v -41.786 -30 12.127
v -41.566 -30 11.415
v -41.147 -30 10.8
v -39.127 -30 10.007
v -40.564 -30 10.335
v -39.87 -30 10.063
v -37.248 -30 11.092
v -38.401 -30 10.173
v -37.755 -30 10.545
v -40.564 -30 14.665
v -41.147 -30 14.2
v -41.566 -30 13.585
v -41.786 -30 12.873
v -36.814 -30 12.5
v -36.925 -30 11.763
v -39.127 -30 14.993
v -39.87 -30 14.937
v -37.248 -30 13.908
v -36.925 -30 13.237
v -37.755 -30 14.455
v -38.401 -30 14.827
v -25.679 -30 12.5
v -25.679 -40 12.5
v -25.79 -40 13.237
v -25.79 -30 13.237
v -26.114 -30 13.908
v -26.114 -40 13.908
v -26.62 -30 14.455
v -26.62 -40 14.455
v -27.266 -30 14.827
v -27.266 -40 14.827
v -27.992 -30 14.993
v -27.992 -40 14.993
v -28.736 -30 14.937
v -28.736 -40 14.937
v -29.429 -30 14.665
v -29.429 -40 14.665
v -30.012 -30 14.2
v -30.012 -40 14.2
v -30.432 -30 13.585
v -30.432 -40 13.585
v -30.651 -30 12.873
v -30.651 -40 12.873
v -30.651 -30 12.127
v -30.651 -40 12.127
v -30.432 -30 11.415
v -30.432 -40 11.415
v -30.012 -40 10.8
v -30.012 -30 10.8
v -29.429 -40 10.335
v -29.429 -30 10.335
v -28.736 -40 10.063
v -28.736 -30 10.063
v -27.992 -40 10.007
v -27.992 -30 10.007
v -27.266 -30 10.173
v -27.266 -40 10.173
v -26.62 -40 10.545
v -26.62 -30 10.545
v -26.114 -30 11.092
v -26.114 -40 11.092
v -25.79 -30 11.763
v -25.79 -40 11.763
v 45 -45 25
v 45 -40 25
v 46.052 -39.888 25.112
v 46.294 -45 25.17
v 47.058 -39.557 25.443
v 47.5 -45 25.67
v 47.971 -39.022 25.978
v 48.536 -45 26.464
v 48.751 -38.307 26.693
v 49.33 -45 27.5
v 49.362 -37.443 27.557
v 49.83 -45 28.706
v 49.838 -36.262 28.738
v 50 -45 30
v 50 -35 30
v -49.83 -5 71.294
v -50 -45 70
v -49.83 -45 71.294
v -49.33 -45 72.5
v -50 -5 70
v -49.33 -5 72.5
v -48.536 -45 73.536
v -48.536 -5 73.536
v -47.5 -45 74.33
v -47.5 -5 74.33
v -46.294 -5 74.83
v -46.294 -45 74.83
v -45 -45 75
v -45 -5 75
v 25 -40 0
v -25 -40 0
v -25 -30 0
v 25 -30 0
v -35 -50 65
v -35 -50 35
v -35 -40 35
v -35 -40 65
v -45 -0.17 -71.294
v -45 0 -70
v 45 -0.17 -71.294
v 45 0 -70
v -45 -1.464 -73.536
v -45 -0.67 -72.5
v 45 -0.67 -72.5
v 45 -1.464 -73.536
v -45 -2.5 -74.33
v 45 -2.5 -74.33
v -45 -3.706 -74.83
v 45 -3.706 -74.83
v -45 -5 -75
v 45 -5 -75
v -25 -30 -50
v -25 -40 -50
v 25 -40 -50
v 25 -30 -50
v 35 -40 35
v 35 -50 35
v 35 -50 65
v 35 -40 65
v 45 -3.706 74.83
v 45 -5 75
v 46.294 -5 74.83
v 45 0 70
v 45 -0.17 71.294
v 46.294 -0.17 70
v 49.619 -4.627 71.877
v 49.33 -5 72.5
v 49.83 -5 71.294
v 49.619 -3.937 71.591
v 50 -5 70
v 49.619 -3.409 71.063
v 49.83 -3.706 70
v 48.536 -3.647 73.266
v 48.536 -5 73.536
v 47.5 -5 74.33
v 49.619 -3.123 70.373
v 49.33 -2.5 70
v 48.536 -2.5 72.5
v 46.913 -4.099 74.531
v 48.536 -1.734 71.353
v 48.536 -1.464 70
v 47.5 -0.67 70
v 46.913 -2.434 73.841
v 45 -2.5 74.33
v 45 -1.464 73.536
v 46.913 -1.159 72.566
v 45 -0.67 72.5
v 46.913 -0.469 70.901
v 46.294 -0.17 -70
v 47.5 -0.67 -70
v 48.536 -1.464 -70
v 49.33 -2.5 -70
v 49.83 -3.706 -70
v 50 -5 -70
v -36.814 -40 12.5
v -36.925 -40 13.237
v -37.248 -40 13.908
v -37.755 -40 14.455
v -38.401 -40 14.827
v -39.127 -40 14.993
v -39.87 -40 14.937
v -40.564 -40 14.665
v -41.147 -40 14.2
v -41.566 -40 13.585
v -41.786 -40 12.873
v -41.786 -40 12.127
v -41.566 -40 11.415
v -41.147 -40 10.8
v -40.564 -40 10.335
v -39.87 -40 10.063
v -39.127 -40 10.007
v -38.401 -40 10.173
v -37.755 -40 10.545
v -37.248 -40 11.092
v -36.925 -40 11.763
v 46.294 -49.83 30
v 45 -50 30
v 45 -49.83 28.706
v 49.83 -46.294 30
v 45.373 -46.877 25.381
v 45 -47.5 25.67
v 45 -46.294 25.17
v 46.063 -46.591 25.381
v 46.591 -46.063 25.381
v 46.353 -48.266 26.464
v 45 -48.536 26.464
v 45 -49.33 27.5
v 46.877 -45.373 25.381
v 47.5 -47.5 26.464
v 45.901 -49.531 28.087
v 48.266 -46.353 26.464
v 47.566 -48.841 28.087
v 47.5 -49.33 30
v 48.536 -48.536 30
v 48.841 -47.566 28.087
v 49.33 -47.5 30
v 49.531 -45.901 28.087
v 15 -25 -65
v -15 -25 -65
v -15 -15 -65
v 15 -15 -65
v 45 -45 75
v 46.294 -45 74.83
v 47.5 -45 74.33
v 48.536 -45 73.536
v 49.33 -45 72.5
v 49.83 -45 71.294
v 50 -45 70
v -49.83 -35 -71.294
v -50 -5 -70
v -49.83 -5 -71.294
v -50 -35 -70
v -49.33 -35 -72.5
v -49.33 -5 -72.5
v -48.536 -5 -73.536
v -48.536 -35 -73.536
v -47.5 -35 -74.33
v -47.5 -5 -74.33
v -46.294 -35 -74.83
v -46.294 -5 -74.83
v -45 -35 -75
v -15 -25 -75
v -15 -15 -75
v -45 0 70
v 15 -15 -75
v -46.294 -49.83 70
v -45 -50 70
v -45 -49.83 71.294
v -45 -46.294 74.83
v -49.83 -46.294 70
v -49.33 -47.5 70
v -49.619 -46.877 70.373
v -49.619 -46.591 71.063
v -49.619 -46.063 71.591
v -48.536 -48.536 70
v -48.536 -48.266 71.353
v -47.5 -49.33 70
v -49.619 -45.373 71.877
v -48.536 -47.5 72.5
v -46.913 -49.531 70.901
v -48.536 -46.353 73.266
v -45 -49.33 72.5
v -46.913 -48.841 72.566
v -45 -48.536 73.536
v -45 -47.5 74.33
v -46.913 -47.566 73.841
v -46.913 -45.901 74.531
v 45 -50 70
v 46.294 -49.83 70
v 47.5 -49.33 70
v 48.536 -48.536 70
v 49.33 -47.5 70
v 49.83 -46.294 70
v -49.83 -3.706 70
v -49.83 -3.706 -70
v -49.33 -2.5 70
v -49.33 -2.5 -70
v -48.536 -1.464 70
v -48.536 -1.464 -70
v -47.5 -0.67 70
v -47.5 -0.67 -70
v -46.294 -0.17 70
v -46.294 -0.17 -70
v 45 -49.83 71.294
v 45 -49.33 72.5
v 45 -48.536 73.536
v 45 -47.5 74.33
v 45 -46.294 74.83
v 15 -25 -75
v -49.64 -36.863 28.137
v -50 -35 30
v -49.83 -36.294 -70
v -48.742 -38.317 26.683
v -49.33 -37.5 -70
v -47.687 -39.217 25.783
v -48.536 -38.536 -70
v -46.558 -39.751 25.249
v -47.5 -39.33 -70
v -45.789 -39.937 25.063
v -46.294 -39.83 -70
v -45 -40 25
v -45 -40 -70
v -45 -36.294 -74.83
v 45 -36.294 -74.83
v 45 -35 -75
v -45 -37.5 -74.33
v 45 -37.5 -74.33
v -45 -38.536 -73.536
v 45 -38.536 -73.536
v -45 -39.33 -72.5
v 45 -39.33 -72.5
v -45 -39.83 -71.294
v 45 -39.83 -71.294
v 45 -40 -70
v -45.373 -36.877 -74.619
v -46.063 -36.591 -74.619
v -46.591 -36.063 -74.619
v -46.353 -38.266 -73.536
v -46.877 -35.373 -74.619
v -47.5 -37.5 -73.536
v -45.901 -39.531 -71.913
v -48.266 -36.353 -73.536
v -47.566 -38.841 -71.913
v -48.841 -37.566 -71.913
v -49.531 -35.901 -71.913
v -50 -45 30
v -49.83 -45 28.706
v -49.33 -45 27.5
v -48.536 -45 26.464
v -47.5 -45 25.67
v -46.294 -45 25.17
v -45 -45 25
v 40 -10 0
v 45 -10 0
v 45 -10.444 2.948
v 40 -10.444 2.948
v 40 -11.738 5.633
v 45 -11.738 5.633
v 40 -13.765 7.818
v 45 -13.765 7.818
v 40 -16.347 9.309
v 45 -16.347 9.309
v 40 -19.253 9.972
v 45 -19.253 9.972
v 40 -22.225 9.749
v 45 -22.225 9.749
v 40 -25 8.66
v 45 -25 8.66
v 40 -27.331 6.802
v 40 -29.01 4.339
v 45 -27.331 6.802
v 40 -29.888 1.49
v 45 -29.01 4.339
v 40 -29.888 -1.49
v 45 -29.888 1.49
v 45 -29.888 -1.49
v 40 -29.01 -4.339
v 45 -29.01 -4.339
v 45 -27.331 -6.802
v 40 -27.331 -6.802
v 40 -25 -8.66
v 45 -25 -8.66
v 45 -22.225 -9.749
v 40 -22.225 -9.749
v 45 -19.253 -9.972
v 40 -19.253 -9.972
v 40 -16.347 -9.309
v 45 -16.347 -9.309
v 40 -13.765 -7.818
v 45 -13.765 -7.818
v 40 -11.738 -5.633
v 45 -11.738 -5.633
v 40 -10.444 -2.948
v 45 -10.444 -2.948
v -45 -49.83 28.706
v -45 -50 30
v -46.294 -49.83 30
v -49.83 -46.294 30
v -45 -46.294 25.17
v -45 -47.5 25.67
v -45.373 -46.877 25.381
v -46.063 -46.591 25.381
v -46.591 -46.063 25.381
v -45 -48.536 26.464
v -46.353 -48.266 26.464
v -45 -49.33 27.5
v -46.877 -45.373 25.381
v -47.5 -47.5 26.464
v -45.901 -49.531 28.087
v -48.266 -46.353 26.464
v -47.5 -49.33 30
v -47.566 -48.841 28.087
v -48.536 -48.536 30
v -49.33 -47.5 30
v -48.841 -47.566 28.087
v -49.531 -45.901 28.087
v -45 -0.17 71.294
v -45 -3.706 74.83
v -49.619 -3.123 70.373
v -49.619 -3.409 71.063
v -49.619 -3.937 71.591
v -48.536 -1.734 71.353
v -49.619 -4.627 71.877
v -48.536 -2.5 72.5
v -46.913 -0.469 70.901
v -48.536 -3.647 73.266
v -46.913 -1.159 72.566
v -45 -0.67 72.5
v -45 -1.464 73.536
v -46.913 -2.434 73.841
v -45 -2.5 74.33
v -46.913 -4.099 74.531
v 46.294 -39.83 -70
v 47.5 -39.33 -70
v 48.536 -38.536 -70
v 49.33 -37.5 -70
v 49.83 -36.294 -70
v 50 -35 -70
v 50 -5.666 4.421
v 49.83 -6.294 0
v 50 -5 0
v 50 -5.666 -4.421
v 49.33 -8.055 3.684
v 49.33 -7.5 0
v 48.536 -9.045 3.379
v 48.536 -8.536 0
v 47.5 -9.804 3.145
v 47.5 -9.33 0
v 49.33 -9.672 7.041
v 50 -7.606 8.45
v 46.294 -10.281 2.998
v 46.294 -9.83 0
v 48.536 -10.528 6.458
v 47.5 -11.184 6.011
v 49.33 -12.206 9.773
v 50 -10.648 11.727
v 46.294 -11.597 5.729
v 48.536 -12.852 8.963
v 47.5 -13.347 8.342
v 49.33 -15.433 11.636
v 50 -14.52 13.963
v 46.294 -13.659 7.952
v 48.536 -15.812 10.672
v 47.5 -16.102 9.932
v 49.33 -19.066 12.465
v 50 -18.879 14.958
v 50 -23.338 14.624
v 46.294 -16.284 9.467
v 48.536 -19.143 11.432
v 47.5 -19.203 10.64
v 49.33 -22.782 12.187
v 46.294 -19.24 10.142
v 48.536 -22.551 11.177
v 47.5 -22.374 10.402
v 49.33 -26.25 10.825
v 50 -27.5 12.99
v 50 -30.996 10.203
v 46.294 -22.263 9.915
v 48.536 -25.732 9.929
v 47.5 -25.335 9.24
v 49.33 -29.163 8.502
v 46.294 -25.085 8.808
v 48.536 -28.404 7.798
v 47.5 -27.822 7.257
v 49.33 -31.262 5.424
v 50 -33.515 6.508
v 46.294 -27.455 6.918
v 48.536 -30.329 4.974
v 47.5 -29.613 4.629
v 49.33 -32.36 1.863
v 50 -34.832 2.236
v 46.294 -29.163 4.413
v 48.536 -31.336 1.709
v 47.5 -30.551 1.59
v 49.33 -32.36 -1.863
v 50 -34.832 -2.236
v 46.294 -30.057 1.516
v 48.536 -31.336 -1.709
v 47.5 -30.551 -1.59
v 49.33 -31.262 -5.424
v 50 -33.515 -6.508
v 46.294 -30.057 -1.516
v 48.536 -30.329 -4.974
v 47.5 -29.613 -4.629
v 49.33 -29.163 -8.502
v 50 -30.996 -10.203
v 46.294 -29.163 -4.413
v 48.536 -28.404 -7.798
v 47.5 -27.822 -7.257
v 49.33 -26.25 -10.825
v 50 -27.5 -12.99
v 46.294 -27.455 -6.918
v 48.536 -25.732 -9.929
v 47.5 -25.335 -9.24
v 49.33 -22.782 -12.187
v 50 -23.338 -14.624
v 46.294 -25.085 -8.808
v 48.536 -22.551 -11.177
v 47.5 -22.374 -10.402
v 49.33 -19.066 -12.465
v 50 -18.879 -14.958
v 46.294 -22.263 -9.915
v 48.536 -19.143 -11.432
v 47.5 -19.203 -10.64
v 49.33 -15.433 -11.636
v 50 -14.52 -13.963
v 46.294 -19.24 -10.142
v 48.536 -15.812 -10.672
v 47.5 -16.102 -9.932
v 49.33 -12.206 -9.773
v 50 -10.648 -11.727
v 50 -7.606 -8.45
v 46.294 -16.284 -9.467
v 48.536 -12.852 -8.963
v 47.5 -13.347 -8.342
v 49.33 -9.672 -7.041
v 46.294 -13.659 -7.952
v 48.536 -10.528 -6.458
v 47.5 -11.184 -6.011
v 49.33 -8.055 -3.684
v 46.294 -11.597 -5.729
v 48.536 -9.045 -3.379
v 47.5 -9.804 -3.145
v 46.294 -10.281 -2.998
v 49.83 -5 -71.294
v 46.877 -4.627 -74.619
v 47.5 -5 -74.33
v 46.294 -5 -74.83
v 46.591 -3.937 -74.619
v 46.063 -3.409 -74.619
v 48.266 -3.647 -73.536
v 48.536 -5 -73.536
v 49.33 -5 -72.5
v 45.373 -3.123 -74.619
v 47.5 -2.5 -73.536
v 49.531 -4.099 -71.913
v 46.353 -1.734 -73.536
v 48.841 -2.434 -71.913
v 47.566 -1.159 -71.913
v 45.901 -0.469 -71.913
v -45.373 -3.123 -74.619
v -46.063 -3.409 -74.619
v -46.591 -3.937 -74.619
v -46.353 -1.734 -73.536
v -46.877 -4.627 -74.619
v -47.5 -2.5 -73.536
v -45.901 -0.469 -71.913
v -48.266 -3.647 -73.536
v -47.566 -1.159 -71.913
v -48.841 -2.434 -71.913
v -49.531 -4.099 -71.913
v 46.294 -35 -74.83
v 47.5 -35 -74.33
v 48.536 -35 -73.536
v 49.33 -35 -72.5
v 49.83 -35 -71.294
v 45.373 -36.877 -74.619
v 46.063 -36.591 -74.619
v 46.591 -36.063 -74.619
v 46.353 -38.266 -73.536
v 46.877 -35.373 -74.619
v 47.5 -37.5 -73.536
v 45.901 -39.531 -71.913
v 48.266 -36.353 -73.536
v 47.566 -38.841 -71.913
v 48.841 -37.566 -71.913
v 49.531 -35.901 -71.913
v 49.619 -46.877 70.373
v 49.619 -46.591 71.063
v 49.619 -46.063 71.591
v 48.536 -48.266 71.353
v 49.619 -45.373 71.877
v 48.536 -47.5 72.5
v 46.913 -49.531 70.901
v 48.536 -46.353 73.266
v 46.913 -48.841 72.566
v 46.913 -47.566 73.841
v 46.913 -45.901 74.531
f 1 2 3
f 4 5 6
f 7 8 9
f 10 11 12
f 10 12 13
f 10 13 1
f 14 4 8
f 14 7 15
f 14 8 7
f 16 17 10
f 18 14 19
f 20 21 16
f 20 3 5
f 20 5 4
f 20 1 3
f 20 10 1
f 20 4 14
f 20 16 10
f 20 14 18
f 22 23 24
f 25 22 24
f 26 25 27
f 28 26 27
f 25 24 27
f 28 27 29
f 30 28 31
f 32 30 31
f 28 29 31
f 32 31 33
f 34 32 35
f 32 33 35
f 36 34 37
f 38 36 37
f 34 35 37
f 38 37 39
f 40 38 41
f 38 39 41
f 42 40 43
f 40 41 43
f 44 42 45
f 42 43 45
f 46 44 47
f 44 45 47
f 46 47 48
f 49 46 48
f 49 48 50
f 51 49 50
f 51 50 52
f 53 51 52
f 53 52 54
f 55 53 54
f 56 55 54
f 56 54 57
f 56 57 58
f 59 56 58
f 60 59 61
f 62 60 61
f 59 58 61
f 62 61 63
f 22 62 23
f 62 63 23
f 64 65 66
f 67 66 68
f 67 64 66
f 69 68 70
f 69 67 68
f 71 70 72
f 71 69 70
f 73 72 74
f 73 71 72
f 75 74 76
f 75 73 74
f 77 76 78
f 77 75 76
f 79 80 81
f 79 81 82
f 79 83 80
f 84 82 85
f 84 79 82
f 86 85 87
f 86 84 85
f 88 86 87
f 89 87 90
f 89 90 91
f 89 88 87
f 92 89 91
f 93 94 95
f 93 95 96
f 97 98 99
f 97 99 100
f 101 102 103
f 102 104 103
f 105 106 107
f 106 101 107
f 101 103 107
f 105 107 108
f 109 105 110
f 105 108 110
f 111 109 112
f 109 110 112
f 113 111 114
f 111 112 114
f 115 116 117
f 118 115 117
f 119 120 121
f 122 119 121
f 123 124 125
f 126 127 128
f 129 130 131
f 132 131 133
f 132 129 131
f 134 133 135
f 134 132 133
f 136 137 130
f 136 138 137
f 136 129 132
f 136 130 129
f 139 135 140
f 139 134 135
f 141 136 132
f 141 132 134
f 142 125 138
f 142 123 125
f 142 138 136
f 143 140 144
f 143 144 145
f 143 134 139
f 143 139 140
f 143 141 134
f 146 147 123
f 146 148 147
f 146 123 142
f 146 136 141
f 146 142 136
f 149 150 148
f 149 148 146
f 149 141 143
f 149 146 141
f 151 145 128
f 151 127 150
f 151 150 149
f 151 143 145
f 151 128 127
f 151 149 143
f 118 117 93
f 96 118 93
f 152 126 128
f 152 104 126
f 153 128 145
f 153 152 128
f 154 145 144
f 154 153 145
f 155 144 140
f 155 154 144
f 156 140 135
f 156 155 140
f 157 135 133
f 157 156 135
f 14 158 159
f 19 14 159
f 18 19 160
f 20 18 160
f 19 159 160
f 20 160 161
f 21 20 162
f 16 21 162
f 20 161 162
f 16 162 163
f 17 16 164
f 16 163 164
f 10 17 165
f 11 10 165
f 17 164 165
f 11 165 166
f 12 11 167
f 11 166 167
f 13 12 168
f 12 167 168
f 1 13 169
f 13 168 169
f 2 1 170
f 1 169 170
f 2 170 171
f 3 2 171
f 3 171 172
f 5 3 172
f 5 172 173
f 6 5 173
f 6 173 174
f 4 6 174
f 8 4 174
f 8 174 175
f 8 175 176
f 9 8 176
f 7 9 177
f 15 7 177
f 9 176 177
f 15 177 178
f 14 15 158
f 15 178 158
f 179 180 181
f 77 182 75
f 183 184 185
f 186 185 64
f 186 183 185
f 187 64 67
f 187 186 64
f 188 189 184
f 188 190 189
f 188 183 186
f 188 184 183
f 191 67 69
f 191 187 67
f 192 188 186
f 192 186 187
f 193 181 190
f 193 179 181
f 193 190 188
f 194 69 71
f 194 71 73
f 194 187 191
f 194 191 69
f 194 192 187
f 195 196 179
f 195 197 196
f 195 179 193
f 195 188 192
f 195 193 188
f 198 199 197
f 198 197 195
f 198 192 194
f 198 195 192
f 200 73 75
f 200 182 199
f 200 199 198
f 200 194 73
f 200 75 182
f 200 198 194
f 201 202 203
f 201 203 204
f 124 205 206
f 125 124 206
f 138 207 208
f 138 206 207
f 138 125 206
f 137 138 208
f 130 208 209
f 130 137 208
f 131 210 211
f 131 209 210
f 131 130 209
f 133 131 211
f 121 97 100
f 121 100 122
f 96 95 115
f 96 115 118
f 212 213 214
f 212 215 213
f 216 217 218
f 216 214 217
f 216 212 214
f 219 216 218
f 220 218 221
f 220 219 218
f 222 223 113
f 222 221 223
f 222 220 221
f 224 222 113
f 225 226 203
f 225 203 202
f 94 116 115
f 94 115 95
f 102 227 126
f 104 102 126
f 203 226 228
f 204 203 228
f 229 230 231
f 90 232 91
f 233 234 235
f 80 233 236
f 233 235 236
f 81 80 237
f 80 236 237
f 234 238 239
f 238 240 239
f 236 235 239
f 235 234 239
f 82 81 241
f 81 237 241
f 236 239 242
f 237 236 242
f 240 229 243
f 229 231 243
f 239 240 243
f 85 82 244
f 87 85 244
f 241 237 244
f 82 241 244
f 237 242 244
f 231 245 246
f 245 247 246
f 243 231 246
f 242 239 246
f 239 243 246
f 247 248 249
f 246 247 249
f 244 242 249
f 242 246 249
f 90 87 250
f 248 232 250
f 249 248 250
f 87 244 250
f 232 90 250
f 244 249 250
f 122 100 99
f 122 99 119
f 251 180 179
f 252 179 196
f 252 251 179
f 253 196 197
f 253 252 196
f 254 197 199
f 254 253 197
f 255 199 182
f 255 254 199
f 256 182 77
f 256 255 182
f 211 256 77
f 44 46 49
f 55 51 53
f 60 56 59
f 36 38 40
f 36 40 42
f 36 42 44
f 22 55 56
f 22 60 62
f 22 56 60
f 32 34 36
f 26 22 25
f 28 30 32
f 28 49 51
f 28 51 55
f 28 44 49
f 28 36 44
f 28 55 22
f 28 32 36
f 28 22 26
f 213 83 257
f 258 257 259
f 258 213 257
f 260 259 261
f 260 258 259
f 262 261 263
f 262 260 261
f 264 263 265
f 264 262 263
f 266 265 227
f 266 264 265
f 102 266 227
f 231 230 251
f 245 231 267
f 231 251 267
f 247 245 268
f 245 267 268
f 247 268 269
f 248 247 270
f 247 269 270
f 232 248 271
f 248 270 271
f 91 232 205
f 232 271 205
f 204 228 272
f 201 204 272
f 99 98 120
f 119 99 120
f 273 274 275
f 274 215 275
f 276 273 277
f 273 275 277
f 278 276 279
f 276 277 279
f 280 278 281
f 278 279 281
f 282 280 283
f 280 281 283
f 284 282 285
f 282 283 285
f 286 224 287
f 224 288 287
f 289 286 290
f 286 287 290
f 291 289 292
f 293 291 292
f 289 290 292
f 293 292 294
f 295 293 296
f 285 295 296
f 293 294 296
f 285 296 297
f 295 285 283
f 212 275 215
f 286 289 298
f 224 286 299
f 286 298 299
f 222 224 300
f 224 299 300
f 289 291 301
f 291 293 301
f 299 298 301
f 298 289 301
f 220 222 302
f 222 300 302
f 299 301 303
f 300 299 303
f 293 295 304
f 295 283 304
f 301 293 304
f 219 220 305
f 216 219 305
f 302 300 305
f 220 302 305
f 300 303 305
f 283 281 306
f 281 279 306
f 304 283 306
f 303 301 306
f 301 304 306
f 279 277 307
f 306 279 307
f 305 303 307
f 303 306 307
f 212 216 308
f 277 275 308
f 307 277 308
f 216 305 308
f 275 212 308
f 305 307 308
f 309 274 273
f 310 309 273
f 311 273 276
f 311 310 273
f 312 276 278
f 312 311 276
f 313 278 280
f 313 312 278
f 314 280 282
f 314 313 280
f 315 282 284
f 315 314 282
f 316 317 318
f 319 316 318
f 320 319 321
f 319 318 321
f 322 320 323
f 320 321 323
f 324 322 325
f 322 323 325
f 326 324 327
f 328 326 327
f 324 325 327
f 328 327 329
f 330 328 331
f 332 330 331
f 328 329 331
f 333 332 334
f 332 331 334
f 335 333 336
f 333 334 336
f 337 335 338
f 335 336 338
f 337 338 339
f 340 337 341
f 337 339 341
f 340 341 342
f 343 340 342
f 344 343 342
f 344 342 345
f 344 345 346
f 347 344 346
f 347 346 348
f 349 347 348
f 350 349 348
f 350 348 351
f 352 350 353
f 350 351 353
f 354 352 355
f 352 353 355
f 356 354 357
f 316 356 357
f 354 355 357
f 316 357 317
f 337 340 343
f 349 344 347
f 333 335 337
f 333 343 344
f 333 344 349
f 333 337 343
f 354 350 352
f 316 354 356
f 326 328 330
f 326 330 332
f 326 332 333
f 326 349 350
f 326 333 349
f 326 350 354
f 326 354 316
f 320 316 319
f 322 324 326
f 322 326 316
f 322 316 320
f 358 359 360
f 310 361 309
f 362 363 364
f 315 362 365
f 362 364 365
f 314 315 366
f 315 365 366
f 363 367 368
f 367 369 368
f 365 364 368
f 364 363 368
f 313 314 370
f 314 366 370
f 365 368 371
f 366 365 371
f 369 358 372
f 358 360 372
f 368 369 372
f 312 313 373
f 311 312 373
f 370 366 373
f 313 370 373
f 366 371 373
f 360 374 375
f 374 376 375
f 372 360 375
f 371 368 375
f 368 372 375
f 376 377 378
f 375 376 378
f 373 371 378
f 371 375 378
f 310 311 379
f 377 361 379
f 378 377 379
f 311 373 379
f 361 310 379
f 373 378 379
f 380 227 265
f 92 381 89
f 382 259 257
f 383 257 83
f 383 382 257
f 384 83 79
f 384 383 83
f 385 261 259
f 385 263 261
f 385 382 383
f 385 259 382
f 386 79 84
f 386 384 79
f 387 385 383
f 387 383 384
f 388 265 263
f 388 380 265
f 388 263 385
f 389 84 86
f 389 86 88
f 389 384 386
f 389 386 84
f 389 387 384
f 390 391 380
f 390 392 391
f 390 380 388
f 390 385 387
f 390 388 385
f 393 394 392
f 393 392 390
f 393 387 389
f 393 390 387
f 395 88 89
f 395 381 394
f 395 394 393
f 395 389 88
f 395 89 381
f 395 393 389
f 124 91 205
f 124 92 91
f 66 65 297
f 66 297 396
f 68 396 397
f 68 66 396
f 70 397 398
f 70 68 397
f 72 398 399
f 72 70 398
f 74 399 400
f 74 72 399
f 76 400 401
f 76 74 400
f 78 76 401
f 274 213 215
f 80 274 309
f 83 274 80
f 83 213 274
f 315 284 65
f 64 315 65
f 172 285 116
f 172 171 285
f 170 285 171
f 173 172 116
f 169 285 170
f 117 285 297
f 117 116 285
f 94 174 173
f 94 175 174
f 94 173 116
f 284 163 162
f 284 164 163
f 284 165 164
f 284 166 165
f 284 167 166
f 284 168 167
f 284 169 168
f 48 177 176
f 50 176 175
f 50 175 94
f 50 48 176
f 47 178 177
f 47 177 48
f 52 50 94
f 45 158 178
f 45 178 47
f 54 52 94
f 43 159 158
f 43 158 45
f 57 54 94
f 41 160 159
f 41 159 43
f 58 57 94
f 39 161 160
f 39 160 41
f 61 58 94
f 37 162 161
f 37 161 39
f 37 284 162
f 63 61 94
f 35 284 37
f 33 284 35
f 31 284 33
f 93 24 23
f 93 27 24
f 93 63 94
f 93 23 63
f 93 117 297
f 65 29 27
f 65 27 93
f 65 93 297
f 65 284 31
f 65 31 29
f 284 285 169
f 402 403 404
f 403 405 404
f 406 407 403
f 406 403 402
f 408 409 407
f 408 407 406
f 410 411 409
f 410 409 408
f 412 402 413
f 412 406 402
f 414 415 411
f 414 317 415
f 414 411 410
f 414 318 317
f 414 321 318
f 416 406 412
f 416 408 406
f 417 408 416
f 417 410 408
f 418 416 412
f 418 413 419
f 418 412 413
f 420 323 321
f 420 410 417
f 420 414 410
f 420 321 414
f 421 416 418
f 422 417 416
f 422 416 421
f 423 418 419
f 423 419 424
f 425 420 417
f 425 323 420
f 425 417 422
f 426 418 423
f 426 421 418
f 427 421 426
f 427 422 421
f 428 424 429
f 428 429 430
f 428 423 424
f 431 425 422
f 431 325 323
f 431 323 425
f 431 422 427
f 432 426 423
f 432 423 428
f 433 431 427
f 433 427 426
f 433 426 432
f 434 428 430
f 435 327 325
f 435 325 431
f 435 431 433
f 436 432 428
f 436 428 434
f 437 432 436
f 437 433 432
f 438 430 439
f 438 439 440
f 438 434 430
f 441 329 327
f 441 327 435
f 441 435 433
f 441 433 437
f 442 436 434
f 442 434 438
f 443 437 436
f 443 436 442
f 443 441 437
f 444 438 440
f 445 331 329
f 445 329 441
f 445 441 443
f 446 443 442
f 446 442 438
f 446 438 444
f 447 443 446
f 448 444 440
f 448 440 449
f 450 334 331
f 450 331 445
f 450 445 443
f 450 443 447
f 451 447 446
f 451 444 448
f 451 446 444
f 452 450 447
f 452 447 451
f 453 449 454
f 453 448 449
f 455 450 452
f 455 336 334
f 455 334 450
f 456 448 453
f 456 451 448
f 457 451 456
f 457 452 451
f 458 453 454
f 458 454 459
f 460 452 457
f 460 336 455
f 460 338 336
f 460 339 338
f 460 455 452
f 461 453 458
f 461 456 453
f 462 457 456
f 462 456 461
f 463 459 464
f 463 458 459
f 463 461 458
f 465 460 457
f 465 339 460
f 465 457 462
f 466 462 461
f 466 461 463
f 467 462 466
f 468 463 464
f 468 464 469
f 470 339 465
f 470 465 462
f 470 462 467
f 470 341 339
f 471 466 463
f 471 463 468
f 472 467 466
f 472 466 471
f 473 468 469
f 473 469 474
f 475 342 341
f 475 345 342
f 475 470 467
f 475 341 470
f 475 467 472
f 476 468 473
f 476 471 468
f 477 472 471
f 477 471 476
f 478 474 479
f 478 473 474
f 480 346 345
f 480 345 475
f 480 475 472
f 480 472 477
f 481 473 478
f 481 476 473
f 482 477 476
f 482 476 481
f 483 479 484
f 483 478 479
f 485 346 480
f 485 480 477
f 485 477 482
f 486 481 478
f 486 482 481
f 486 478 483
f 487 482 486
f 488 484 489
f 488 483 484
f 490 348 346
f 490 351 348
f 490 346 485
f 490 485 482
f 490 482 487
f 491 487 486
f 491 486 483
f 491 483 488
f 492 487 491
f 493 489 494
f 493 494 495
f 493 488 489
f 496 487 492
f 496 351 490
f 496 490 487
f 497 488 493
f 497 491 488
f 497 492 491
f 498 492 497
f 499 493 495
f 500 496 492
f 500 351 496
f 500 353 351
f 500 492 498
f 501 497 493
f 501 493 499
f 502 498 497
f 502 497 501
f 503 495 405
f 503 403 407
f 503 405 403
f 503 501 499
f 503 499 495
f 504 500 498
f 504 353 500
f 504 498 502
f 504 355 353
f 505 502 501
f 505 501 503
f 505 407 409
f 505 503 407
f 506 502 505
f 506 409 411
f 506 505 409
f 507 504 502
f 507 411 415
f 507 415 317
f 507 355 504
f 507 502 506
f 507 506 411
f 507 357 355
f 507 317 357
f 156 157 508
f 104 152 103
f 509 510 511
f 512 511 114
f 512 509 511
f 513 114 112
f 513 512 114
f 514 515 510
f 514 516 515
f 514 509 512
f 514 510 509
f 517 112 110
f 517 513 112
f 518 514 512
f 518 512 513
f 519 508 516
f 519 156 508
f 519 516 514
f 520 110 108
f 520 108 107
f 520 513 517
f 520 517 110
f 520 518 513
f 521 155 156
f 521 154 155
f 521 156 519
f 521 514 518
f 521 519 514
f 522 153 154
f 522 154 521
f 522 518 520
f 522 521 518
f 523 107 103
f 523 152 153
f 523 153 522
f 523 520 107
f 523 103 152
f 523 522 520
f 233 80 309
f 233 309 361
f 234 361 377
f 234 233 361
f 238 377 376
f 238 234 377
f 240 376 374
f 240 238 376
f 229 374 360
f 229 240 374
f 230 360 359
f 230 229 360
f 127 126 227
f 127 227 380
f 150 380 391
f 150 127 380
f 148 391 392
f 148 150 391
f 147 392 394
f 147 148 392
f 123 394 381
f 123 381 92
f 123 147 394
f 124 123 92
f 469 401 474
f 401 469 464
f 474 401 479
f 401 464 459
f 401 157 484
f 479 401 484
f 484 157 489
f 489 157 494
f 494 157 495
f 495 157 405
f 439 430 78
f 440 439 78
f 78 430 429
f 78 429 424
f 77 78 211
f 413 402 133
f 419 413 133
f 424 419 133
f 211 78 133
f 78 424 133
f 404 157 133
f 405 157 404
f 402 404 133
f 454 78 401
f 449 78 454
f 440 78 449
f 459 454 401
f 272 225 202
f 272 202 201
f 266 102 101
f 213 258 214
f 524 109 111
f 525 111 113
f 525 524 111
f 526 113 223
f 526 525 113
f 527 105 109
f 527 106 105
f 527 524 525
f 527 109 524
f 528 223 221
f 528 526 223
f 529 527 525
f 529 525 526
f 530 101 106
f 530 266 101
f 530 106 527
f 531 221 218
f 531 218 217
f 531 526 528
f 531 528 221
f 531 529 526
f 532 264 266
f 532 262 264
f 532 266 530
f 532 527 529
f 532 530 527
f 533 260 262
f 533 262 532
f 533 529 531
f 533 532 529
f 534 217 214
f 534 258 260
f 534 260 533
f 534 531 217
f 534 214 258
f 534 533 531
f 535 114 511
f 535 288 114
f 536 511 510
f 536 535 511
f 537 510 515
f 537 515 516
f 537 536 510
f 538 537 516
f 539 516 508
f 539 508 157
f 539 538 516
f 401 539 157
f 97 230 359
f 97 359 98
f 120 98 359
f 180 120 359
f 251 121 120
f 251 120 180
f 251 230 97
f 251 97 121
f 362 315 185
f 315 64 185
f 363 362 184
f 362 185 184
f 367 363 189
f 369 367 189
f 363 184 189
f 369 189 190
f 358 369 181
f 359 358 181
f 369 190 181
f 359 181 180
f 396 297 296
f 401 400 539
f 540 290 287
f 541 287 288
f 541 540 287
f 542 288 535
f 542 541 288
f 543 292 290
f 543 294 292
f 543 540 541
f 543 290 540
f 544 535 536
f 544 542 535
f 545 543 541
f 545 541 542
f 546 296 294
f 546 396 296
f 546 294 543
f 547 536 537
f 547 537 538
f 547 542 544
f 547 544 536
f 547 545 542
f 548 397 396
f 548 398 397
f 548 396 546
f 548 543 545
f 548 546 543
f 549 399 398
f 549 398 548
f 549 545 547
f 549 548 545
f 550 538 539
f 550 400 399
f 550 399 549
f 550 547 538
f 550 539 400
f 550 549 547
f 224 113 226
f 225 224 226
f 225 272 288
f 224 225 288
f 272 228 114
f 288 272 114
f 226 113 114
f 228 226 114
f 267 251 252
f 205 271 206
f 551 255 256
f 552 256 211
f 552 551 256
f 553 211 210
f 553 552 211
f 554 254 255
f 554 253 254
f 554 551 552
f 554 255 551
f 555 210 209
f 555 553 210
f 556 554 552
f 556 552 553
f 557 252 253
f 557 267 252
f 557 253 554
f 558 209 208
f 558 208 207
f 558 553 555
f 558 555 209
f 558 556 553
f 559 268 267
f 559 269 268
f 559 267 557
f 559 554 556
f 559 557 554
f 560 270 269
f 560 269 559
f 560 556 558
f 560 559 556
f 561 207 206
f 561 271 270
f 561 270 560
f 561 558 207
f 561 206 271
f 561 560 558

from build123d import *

# Parameters (mm, degrees)
F0_W      = 100
F0_H      = 50
F1_DEPTH  = 50
F3_DEPTH  = 10
F0_H_2    = 100
F4_DEPTH  = 40
F5_R      = 10
F6_DEPTH  = 10
F7_W      = 70
F7_H      = 30
F8_DEPTH  = 10
F9_W      = 30
F9_H      = 10
F10_DEPTH = 10
F11_W     = 50
F11_H     = 50
F12_DEPTH = 10
F13_R     = 4.99999
F14_R     = 2.5
F15_DEPTH = 10


# Not quite as in the source:
# - a fillet or chamfer is up to 0.001 mm smaller than in the source, because OpenCascade refuses the exact size


with BuildPart() as f1:
    # F0 (on Front) → F1 (new body)
    with BuildSketch(Plane.XZ):
        with Locations((0, 50)):
            Rectangle(F0_W, F0_H)
    extrude(amount=F1_DEPTH)

    # F2 (on face) → F3 (cut)
    with BuildSketch(Plane.YZ.offset(50)):
        with BuildLine():
            Line((-35, 25), (-15, 25))
            ThreePointArc((-15, 25), (-25, 35), (-35, 25))
        make_face()
        with BuildLine():
            ThreePointArc((-35, 25), (-25, 15), (-15, 25))
            Line((-15, 25), (-35, 25))
        make_face()
    extrude(amount=-F3_DEPTH, mode=Mode.SUBTRACT)

    # F0 (on Front) → F4 (join)
    with BuildSketch(Plane.XZ):
        with Locations((0, 50)):
            Rectangle(F0_W, F0_H)
        with Locations((0, -25)):
            Rectangle(F0_W, F0_H_2)
    extrude(amount=F4_DEPTH)

    # F5 (on face) → F6 (cut)
    with BuildSketch(Plane.YZ.offset(50)):
        with Locations((-20, 0)):
            Circle(F5_R)
    extrude(amount=-F6_DEPTH, mode=Mode.SUBTRACT)

    # F7 (on face) → F8 (cut)
    with BuildSketch(Plane.XZ.offset(50)):
        with Locations((0, 50)):
            Rectangle(F7_W, F7_H)
    extrude(amount=-F8_DEPTH, mode=Mode.SUBTRACT)

    # F9 (on face) → F10 (cut)
    with BuildSketch(Plane(origin=(0, 0, -75), x_dir=(1, 0, 0), z_dir=(0, 0, -1))):
        with Locations((0, 20)):
            Rectangle(F9_W, F9_H)
    extrude(amount=-F10_DEPTH, mode=Mode.SUBTRACT)

    # F11 (on face) → F12 (cut)
    with BuildSketch(Plane.XZ.offset(40)):
        with Locations((0, -25)):
            Rectangle(F11_W, F11_H)
    extrude(amount=-F12_DEPTH, mode=Mode.SUBTRACT)

    # F13 (radius 5 in the source; OpenCascade refuses exactly that, so slightly less here)
    f13_edges = [f1.edges().sort_by_distance(p)[0] for p in [
        (0, -50, 75),
        (-50, -50, 50),
        (50, -50, 50),
        (0, -50, 25),
        (-50, -40, -25),
        (50, -40, -25),
        (0, -40, -75),
        (0, 0, 75),
        (-50, 0, 0),
        (50, -25, 75),
        (-50, -25, 75),
        (50, 0, 0),
        (50, -20, -75),
        (50, -45, 25),
        (50, -30, 0),
        (0, 0, -75),
        (-50, -20, -75),
        (-50, -45, 25),
    ]]
    fillet(f13_edges, radius=F13_R)

    # F14 (on face) → F15 (cut)
    with BuildSketch(Plane.XZ.offset(40)):
        with Locations((-39.3138879017, 12.5)):
            Circle(F14_R)
        with Locations((-28.179211659, 12.5)):
            Circle(F14_R)
    extrude(amount=-F15_DEPTH, mode=Mode.SUBTRACT)


solid = f1.part
